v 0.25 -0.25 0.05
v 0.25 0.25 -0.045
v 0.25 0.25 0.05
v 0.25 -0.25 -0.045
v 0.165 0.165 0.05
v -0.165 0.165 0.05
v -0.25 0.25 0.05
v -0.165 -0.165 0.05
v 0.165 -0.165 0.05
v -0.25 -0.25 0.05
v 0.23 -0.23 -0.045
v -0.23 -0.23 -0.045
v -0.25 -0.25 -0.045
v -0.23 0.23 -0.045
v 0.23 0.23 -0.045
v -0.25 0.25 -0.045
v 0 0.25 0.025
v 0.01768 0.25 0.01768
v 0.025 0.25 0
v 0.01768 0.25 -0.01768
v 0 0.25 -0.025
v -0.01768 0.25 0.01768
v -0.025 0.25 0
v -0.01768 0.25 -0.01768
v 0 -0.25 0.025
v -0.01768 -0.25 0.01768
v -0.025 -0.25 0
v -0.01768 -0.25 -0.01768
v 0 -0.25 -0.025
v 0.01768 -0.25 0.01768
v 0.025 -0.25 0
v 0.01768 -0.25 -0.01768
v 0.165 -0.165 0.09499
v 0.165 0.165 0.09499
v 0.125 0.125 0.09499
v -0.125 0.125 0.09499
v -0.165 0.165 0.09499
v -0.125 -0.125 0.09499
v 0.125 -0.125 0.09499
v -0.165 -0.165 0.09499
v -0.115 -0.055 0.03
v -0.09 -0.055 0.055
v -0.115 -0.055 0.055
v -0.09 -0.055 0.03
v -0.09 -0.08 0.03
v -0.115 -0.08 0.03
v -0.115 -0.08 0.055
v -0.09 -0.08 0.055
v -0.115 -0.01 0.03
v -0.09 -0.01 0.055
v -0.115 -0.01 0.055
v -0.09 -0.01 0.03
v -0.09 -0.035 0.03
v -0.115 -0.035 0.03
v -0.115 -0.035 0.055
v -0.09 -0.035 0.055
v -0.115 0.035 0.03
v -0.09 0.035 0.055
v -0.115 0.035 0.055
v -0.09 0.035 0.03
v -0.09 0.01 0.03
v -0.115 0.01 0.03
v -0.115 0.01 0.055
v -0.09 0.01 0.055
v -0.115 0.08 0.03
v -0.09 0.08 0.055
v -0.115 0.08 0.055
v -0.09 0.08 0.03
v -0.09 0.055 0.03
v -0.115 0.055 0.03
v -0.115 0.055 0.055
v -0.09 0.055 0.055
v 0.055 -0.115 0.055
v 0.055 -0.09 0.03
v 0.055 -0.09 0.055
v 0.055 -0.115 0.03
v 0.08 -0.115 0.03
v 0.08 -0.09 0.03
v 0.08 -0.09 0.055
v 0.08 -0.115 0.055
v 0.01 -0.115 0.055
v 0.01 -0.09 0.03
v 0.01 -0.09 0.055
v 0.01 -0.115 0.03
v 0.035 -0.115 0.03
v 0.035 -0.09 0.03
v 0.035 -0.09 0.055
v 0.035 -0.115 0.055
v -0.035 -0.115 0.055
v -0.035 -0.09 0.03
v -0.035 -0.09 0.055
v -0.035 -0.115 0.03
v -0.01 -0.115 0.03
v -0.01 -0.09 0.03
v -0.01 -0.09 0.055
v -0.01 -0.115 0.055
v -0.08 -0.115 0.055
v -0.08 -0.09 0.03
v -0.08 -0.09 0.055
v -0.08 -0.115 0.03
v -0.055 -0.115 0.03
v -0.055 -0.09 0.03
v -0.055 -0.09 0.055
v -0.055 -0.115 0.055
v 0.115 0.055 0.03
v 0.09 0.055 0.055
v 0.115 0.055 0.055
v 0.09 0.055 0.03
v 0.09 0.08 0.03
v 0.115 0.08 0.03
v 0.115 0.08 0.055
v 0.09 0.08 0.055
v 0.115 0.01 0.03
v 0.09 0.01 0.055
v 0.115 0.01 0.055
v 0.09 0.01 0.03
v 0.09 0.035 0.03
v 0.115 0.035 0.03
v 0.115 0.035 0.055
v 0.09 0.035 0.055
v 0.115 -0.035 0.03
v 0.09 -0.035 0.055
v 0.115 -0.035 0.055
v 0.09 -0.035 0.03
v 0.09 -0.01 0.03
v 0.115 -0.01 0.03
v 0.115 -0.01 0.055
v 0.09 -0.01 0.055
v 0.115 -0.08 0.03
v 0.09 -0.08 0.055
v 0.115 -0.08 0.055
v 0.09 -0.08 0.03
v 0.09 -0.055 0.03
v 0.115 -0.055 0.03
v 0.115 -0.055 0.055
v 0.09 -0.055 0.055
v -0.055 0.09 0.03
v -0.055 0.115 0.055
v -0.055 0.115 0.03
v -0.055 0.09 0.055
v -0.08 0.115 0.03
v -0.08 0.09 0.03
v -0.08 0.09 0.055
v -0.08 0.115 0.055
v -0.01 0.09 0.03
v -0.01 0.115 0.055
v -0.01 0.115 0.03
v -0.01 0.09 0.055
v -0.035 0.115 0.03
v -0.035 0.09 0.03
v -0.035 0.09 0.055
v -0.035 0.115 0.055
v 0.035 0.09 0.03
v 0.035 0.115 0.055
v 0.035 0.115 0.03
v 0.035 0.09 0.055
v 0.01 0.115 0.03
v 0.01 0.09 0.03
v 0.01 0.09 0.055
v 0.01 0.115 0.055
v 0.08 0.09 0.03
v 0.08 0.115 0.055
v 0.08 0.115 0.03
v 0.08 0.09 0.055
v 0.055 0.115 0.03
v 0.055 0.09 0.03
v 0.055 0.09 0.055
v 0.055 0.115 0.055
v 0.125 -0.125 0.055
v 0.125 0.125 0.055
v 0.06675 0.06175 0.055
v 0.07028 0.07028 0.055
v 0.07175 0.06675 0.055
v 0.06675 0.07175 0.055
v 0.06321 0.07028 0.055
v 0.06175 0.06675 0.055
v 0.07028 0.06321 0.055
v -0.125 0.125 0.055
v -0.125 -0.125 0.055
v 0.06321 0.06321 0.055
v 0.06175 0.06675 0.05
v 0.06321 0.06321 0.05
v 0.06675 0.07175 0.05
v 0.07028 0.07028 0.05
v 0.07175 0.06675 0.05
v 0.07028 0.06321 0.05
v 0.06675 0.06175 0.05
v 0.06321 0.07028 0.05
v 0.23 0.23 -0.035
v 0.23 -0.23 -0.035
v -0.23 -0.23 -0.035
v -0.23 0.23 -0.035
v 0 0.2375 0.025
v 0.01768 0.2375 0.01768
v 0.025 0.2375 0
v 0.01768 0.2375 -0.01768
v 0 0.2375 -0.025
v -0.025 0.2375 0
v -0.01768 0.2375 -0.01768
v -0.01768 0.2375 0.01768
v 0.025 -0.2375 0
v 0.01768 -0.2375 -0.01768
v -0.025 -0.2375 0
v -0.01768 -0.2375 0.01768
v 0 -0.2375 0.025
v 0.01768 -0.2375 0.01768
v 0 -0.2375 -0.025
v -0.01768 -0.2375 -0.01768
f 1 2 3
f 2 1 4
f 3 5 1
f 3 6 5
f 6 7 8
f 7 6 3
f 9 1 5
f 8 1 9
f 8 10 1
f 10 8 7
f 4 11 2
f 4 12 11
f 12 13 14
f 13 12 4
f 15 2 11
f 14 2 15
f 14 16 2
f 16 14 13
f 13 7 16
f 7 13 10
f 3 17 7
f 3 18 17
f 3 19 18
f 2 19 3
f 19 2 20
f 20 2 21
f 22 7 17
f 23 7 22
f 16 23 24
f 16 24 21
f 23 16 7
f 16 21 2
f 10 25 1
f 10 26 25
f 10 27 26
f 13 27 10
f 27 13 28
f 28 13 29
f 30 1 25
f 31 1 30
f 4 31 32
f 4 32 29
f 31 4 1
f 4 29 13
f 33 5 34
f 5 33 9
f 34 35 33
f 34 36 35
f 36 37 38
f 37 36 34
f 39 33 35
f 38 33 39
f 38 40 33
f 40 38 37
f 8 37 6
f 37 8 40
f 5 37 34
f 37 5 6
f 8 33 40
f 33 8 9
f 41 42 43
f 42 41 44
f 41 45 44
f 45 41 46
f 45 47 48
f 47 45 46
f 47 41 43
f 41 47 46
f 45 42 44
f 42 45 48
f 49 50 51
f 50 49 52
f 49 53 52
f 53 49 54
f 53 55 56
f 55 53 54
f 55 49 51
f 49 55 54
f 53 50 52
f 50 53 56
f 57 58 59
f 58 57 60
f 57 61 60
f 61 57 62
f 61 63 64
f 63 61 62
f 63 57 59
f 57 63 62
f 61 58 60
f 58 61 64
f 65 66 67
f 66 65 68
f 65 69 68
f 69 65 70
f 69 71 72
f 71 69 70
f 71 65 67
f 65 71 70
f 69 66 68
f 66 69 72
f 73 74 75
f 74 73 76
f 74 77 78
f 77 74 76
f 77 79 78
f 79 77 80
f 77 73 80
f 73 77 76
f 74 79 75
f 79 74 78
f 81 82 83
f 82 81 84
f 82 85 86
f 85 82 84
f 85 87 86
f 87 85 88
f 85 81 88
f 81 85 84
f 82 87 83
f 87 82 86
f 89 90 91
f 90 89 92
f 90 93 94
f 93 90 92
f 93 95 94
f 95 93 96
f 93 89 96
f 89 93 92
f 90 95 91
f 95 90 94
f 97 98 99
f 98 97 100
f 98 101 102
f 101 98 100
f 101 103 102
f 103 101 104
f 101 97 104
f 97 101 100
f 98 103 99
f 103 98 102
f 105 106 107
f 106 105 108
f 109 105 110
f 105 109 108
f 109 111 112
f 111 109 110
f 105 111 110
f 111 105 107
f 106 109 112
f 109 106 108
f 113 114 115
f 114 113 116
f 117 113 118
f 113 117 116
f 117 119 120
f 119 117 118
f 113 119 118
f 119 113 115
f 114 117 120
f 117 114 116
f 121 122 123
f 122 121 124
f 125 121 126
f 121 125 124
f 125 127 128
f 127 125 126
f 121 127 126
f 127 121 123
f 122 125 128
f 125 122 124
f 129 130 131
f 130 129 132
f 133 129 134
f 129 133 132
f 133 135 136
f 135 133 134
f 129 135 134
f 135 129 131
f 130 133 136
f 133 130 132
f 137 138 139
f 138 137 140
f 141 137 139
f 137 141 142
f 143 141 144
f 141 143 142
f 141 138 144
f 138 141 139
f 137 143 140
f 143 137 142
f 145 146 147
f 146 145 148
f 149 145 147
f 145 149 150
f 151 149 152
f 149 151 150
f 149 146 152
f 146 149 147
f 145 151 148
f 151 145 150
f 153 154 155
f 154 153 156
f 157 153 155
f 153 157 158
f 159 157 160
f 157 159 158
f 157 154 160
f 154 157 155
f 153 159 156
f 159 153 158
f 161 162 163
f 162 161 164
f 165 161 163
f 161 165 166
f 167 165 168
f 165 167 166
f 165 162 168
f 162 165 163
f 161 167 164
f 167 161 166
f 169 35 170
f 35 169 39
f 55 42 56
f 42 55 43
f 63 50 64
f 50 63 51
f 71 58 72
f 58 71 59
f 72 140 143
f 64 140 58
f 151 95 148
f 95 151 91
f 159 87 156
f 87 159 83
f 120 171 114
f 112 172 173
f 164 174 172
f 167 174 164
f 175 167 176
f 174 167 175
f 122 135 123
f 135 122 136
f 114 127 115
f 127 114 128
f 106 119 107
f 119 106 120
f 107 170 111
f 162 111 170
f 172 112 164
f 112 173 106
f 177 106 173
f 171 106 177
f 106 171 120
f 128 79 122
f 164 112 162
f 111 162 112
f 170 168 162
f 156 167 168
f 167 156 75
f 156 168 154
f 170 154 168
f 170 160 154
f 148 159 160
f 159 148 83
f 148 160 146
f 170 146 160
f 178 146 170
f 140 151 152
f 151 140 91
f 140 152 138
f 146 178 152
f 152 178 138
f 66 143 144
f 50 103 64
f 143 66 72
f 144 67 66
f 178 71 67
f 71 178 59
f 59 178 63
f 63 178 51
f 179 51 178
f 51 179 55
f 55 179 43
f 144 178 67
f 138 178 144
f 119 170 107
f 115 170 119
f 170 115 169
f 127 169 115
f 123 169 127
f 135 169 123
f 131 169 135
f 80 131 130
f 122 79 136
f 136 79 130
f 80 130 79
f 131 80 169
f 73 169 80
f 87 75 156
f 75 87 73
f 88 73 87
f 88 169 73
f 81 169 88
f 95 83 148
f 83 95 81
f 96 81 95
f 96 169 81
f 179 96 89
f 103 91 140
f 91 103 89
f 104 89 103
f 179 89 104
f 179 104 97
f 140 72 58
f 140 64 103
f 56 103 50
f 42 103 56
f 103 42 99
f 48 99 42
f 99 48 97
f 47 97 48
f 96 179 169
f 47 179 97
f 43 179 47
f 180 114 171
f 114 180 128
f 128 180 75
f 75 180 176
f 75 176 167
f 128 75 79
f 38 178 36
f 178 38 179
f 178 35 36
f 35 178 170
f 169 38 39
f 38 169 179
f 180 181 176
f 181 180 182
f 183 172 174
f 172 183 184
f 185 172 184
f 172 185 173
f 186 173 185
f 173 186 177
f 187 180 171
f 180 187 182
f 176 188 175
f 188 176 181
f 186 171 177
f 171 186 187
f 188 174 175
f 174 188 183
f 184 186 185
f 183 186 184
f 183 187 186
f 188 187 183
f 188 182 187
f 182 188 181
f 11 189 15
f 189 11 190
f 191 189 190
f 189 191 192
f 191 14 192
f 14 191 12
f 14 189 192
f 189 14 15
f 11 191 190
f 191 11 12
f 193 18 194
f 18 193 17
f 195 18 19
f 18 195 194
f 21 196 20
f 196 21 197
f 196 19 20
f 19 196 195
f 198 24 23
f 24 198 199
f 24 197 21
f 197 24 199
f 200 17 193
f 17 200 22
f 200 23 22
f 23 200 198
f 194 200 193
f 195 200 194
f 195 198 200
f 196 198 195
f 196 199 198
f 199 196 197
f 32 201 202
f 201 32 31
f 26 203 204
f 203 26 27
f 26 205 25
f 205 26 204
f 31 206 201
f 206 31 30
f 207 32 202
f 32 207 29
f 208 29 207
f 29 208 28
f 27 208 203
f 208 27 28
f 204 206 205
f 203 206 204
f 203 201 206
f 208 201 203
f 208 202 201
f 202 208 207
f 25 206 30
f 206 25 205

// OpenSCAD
// file: DataSymbol.scad
boxSize = 0.029;
lineSize = 0.0045;
symDepth = 0.01;
vertSeparation = 0.019;
horizSeparation = 0.018;

module DataSymbol() {
  boxVertCenter = (boxSize+vertSeparation)/2;
  boxHorizCenter = (boxSize+horizSeparation)/2;
  linear_extrude(symDepth, center=true) {
    translate([0,boxVertCenter]) square(boxSize, center=true); // top box
    translate([-boxHorizCenter,-boxVertCenter]) square(boxSize, center=true); // bottom left box
    translate([boxHorizCenter,-boxVertCenter]) square(boxSize, center=true); // bottom right box
    square([2*boxHorizCenter + lineSize, lineSize], center=true); // middle line
    translate([0, horizSeparation/4]) square([lineSize, horizSeparation/2 + lineSize], center=true); // line to top
    translate([-boxHorizCenter, -horizSeparation/4]) square([lineSize, horizSeparation/2 + lineSize], center=true); // line to bottom left
    translate([boxHorizCenter, -horizSeparation/4]) square([lineSize, horizSeparation/2 + lineSize], center=true); // line to bottom right
  }
}

DataSymbol();
// file: PowerSymbol.scad
symWidth = 0.038;
symHeight = 0.086;
symDepth = 0.01;
middleHeight = 0.0075;
topHorizOffset = 0.007;
sideVertOffset = 0.007;

module PowerSymbol() {
  linear_extrude(symDepth, center=true) {
    halfHei = symHeight/2;
    halfWid = symWidth/2;
    halfMid = middleHeight/2;
    polygon([
      [topHorizOffset, halfHei],
      [0, halfMid],
      [halfWid, sideVertOffset],
      [-topHorizOffset, -halfHei],
      [0, -halfMid],
      [-halfWid, -sideVertOffset]
    ]);
  }
}

PowerSymbol();
// file: FPGAHousing_paintcap.scad
include <FPGA_shared.scad>;
use <FPGAHousing_base.scad>;

module FPGAHousing_paintcap() {
  bevelDepth = capBevel * sqrt(2);
  difference() {
    translate([0,0,baseTop]) {
      cube(size=[capSize, capSize, capDepth*2], center=true);
    }
    cube(size=[slotSize+eps*10, slotSize+eps*10, smallGridSize], center=true);
    for (edge=[1:4]) rotate([0,0,90*edge]) {
      translate([0,capSize/2,baseTop+capDepth]) rotate([45,0,0])
        cube(size=[capSize+0.1, bevelDepth, bevelDepth*2], center=true);
    }
  }
}

%FPGAHousing_base();
FPGAHousing_paintcap();
// file: FPGAHousing_base.scad
include <FPGA_shared.scad>;
use <FPGAHousing_paintcap.scad>;
use <PowerSymbol.scad>;
use <DataSymbol.scad>;

module FPGAHousing_chipcutout() {
  slotPinBaseOffset = (-slotPinEdgeCount-1)/2 * slotPinEdgeSpacing;
  slotPinEdgeOffset = slotSize/2 - slotPinSize/2 - slotPinEdgePad;
  union() {
    translate([0, 0, baseDepth/2 + slotBottom + slotPinDepth]) {
      cube(size=[slotSize, slotSize, baseDepth], center=true);
    }
    for(edge=[1:4]) rotate([0,0,90*edge]) {
      for(i=[1:slotPinEdgeCount]) {
        translate([
          slotPinBaseOffset + slotPinEdgeSpacing*i,
          slotPinEdgeOffset,
          slotBottom + slotPinDepth
        ]) {
          cube(size=[slotPinSize, slotPinSize, slotPinDepth*2], center=true);
        }
      }
    }
    translate([alignHoleOffset,alignHoleOffset,slotBottom + slotPinDepth])
      cylinder(h=alignHoleDepth*2, r=alignHoleRadius, center=true, $fn=alignHoleSides);
  }
}

module FPGAHousing_base() {
  middleSize = (slotSize + capSize) / 2;
  difference() {
    union() {
      translate([0,0,baseCenter])
        cube(size=[baseSize, baseSize, baseDepth], center=true);
      translate([0,0,baseTop-eps])
        cube(size=[middleSize, middleSize, capDepth*2], center=true);
    }
    translate([0,0,baseBottom])
      cube(size=[baseBackCutoutSize, baseBackCutoutSize, baseBackCutoutDepth*2], center=true);
    FPGAHousing_chipcutout();
  }
}

FPGAHousing_base();
%FPGAHousing_paintcap();
// file: FPGA_shared.scad
smallGridSize = 0.5;
baseSize = smallGridSize;
baseTop = 0.05;
baseBottom = -0.045;
baseDepth = baseTop - baseBottom;
baseCenter = (baseTop + baseBottom)/2;
baseBackRim = 0.02;
baseBackCutoutSize = baseSize - baseBackRim*2;
baseBackCutoutDepth = 0.01;
capSize = 0.41;
capDepth = 0.045;
capBevel = 0.01;
slotSize = smallGridSize * 0.5;
slotBottom = 0.03;
slotPinEdgeCount = 4;
slotPinEdgePad = 0.01;
slotPinEdgeSpacing = 0.045;
slotPinSize = 0.025;
slotPinDepth = 0.025;
eps = 0.00001;
chipTotalSize = slotSize - slotPinEdgePad*2 - slotPinSize/2;
chipTotalHeight = 0.1;
chipBaseHeight = 0.05;
pinHorizLength = 0.022;
pinHorizUnderLength = 0.008;
pinHorizWidth = 0.02;
pinHorizHeight = 0.015;
pinVertInnerOffset = 0.003;
pinVertOuterOffset = 0.003;
pinVertNarrowOffset = 0.003;
pinTotalHeight = chipTotalHeight - chipBaseHeight/2 + pinHorizHeight/2;
chipBaseSize = chipTotalSize - pinHorizLength*2;
chipBaseBevelSize = 0.005;
alignHoleRadius = 0.005;
alignHoleOffset = chipBaseSize/2 - 0.02;
alignHoleDepth = 0.005;
alignHoleSides = 8;
decoPinCount = 8;
decoPinWidth = 0.036;
decoPinLength = 0.034;
decoPinHeight = 0.028;
decoPinSpacing = 0.049;
decoPinBevelSize = 0.010;

module cablecutout() {
  cableradius = 0.025;
  cableDepth = 0.0125;
  translate([0,smallGridSize/2,0]) rotate([90,0,0]) {
    cylinder(h=cableDepth*2, r=cableradius, center=true, $fn=8);
  }
}
// main file
include <FPGA_shared.scad>;
use <FPGAHousing_base.scad>;
use <FPGAHousing_paintcap.scad>;
use <PowerSymbol.scad>;
use <DataSymbol.scad>;

module FPGAHousing_logicbase() {
  difference() {
    FPGAHousing_base();
    cablecutout();
    rotate([0,0,180]) cablecutout();
  }
}

FPGAHousing_logicbase();
%FPGAHousing_paintcap();
%translate([0.067,0.25,-0.001]) rotate([-90, 0, 0]) PowerSymbol();
%translate([0.073,-0.25,0.001]) rotate([90, 0, 0]) DataSymbol();
